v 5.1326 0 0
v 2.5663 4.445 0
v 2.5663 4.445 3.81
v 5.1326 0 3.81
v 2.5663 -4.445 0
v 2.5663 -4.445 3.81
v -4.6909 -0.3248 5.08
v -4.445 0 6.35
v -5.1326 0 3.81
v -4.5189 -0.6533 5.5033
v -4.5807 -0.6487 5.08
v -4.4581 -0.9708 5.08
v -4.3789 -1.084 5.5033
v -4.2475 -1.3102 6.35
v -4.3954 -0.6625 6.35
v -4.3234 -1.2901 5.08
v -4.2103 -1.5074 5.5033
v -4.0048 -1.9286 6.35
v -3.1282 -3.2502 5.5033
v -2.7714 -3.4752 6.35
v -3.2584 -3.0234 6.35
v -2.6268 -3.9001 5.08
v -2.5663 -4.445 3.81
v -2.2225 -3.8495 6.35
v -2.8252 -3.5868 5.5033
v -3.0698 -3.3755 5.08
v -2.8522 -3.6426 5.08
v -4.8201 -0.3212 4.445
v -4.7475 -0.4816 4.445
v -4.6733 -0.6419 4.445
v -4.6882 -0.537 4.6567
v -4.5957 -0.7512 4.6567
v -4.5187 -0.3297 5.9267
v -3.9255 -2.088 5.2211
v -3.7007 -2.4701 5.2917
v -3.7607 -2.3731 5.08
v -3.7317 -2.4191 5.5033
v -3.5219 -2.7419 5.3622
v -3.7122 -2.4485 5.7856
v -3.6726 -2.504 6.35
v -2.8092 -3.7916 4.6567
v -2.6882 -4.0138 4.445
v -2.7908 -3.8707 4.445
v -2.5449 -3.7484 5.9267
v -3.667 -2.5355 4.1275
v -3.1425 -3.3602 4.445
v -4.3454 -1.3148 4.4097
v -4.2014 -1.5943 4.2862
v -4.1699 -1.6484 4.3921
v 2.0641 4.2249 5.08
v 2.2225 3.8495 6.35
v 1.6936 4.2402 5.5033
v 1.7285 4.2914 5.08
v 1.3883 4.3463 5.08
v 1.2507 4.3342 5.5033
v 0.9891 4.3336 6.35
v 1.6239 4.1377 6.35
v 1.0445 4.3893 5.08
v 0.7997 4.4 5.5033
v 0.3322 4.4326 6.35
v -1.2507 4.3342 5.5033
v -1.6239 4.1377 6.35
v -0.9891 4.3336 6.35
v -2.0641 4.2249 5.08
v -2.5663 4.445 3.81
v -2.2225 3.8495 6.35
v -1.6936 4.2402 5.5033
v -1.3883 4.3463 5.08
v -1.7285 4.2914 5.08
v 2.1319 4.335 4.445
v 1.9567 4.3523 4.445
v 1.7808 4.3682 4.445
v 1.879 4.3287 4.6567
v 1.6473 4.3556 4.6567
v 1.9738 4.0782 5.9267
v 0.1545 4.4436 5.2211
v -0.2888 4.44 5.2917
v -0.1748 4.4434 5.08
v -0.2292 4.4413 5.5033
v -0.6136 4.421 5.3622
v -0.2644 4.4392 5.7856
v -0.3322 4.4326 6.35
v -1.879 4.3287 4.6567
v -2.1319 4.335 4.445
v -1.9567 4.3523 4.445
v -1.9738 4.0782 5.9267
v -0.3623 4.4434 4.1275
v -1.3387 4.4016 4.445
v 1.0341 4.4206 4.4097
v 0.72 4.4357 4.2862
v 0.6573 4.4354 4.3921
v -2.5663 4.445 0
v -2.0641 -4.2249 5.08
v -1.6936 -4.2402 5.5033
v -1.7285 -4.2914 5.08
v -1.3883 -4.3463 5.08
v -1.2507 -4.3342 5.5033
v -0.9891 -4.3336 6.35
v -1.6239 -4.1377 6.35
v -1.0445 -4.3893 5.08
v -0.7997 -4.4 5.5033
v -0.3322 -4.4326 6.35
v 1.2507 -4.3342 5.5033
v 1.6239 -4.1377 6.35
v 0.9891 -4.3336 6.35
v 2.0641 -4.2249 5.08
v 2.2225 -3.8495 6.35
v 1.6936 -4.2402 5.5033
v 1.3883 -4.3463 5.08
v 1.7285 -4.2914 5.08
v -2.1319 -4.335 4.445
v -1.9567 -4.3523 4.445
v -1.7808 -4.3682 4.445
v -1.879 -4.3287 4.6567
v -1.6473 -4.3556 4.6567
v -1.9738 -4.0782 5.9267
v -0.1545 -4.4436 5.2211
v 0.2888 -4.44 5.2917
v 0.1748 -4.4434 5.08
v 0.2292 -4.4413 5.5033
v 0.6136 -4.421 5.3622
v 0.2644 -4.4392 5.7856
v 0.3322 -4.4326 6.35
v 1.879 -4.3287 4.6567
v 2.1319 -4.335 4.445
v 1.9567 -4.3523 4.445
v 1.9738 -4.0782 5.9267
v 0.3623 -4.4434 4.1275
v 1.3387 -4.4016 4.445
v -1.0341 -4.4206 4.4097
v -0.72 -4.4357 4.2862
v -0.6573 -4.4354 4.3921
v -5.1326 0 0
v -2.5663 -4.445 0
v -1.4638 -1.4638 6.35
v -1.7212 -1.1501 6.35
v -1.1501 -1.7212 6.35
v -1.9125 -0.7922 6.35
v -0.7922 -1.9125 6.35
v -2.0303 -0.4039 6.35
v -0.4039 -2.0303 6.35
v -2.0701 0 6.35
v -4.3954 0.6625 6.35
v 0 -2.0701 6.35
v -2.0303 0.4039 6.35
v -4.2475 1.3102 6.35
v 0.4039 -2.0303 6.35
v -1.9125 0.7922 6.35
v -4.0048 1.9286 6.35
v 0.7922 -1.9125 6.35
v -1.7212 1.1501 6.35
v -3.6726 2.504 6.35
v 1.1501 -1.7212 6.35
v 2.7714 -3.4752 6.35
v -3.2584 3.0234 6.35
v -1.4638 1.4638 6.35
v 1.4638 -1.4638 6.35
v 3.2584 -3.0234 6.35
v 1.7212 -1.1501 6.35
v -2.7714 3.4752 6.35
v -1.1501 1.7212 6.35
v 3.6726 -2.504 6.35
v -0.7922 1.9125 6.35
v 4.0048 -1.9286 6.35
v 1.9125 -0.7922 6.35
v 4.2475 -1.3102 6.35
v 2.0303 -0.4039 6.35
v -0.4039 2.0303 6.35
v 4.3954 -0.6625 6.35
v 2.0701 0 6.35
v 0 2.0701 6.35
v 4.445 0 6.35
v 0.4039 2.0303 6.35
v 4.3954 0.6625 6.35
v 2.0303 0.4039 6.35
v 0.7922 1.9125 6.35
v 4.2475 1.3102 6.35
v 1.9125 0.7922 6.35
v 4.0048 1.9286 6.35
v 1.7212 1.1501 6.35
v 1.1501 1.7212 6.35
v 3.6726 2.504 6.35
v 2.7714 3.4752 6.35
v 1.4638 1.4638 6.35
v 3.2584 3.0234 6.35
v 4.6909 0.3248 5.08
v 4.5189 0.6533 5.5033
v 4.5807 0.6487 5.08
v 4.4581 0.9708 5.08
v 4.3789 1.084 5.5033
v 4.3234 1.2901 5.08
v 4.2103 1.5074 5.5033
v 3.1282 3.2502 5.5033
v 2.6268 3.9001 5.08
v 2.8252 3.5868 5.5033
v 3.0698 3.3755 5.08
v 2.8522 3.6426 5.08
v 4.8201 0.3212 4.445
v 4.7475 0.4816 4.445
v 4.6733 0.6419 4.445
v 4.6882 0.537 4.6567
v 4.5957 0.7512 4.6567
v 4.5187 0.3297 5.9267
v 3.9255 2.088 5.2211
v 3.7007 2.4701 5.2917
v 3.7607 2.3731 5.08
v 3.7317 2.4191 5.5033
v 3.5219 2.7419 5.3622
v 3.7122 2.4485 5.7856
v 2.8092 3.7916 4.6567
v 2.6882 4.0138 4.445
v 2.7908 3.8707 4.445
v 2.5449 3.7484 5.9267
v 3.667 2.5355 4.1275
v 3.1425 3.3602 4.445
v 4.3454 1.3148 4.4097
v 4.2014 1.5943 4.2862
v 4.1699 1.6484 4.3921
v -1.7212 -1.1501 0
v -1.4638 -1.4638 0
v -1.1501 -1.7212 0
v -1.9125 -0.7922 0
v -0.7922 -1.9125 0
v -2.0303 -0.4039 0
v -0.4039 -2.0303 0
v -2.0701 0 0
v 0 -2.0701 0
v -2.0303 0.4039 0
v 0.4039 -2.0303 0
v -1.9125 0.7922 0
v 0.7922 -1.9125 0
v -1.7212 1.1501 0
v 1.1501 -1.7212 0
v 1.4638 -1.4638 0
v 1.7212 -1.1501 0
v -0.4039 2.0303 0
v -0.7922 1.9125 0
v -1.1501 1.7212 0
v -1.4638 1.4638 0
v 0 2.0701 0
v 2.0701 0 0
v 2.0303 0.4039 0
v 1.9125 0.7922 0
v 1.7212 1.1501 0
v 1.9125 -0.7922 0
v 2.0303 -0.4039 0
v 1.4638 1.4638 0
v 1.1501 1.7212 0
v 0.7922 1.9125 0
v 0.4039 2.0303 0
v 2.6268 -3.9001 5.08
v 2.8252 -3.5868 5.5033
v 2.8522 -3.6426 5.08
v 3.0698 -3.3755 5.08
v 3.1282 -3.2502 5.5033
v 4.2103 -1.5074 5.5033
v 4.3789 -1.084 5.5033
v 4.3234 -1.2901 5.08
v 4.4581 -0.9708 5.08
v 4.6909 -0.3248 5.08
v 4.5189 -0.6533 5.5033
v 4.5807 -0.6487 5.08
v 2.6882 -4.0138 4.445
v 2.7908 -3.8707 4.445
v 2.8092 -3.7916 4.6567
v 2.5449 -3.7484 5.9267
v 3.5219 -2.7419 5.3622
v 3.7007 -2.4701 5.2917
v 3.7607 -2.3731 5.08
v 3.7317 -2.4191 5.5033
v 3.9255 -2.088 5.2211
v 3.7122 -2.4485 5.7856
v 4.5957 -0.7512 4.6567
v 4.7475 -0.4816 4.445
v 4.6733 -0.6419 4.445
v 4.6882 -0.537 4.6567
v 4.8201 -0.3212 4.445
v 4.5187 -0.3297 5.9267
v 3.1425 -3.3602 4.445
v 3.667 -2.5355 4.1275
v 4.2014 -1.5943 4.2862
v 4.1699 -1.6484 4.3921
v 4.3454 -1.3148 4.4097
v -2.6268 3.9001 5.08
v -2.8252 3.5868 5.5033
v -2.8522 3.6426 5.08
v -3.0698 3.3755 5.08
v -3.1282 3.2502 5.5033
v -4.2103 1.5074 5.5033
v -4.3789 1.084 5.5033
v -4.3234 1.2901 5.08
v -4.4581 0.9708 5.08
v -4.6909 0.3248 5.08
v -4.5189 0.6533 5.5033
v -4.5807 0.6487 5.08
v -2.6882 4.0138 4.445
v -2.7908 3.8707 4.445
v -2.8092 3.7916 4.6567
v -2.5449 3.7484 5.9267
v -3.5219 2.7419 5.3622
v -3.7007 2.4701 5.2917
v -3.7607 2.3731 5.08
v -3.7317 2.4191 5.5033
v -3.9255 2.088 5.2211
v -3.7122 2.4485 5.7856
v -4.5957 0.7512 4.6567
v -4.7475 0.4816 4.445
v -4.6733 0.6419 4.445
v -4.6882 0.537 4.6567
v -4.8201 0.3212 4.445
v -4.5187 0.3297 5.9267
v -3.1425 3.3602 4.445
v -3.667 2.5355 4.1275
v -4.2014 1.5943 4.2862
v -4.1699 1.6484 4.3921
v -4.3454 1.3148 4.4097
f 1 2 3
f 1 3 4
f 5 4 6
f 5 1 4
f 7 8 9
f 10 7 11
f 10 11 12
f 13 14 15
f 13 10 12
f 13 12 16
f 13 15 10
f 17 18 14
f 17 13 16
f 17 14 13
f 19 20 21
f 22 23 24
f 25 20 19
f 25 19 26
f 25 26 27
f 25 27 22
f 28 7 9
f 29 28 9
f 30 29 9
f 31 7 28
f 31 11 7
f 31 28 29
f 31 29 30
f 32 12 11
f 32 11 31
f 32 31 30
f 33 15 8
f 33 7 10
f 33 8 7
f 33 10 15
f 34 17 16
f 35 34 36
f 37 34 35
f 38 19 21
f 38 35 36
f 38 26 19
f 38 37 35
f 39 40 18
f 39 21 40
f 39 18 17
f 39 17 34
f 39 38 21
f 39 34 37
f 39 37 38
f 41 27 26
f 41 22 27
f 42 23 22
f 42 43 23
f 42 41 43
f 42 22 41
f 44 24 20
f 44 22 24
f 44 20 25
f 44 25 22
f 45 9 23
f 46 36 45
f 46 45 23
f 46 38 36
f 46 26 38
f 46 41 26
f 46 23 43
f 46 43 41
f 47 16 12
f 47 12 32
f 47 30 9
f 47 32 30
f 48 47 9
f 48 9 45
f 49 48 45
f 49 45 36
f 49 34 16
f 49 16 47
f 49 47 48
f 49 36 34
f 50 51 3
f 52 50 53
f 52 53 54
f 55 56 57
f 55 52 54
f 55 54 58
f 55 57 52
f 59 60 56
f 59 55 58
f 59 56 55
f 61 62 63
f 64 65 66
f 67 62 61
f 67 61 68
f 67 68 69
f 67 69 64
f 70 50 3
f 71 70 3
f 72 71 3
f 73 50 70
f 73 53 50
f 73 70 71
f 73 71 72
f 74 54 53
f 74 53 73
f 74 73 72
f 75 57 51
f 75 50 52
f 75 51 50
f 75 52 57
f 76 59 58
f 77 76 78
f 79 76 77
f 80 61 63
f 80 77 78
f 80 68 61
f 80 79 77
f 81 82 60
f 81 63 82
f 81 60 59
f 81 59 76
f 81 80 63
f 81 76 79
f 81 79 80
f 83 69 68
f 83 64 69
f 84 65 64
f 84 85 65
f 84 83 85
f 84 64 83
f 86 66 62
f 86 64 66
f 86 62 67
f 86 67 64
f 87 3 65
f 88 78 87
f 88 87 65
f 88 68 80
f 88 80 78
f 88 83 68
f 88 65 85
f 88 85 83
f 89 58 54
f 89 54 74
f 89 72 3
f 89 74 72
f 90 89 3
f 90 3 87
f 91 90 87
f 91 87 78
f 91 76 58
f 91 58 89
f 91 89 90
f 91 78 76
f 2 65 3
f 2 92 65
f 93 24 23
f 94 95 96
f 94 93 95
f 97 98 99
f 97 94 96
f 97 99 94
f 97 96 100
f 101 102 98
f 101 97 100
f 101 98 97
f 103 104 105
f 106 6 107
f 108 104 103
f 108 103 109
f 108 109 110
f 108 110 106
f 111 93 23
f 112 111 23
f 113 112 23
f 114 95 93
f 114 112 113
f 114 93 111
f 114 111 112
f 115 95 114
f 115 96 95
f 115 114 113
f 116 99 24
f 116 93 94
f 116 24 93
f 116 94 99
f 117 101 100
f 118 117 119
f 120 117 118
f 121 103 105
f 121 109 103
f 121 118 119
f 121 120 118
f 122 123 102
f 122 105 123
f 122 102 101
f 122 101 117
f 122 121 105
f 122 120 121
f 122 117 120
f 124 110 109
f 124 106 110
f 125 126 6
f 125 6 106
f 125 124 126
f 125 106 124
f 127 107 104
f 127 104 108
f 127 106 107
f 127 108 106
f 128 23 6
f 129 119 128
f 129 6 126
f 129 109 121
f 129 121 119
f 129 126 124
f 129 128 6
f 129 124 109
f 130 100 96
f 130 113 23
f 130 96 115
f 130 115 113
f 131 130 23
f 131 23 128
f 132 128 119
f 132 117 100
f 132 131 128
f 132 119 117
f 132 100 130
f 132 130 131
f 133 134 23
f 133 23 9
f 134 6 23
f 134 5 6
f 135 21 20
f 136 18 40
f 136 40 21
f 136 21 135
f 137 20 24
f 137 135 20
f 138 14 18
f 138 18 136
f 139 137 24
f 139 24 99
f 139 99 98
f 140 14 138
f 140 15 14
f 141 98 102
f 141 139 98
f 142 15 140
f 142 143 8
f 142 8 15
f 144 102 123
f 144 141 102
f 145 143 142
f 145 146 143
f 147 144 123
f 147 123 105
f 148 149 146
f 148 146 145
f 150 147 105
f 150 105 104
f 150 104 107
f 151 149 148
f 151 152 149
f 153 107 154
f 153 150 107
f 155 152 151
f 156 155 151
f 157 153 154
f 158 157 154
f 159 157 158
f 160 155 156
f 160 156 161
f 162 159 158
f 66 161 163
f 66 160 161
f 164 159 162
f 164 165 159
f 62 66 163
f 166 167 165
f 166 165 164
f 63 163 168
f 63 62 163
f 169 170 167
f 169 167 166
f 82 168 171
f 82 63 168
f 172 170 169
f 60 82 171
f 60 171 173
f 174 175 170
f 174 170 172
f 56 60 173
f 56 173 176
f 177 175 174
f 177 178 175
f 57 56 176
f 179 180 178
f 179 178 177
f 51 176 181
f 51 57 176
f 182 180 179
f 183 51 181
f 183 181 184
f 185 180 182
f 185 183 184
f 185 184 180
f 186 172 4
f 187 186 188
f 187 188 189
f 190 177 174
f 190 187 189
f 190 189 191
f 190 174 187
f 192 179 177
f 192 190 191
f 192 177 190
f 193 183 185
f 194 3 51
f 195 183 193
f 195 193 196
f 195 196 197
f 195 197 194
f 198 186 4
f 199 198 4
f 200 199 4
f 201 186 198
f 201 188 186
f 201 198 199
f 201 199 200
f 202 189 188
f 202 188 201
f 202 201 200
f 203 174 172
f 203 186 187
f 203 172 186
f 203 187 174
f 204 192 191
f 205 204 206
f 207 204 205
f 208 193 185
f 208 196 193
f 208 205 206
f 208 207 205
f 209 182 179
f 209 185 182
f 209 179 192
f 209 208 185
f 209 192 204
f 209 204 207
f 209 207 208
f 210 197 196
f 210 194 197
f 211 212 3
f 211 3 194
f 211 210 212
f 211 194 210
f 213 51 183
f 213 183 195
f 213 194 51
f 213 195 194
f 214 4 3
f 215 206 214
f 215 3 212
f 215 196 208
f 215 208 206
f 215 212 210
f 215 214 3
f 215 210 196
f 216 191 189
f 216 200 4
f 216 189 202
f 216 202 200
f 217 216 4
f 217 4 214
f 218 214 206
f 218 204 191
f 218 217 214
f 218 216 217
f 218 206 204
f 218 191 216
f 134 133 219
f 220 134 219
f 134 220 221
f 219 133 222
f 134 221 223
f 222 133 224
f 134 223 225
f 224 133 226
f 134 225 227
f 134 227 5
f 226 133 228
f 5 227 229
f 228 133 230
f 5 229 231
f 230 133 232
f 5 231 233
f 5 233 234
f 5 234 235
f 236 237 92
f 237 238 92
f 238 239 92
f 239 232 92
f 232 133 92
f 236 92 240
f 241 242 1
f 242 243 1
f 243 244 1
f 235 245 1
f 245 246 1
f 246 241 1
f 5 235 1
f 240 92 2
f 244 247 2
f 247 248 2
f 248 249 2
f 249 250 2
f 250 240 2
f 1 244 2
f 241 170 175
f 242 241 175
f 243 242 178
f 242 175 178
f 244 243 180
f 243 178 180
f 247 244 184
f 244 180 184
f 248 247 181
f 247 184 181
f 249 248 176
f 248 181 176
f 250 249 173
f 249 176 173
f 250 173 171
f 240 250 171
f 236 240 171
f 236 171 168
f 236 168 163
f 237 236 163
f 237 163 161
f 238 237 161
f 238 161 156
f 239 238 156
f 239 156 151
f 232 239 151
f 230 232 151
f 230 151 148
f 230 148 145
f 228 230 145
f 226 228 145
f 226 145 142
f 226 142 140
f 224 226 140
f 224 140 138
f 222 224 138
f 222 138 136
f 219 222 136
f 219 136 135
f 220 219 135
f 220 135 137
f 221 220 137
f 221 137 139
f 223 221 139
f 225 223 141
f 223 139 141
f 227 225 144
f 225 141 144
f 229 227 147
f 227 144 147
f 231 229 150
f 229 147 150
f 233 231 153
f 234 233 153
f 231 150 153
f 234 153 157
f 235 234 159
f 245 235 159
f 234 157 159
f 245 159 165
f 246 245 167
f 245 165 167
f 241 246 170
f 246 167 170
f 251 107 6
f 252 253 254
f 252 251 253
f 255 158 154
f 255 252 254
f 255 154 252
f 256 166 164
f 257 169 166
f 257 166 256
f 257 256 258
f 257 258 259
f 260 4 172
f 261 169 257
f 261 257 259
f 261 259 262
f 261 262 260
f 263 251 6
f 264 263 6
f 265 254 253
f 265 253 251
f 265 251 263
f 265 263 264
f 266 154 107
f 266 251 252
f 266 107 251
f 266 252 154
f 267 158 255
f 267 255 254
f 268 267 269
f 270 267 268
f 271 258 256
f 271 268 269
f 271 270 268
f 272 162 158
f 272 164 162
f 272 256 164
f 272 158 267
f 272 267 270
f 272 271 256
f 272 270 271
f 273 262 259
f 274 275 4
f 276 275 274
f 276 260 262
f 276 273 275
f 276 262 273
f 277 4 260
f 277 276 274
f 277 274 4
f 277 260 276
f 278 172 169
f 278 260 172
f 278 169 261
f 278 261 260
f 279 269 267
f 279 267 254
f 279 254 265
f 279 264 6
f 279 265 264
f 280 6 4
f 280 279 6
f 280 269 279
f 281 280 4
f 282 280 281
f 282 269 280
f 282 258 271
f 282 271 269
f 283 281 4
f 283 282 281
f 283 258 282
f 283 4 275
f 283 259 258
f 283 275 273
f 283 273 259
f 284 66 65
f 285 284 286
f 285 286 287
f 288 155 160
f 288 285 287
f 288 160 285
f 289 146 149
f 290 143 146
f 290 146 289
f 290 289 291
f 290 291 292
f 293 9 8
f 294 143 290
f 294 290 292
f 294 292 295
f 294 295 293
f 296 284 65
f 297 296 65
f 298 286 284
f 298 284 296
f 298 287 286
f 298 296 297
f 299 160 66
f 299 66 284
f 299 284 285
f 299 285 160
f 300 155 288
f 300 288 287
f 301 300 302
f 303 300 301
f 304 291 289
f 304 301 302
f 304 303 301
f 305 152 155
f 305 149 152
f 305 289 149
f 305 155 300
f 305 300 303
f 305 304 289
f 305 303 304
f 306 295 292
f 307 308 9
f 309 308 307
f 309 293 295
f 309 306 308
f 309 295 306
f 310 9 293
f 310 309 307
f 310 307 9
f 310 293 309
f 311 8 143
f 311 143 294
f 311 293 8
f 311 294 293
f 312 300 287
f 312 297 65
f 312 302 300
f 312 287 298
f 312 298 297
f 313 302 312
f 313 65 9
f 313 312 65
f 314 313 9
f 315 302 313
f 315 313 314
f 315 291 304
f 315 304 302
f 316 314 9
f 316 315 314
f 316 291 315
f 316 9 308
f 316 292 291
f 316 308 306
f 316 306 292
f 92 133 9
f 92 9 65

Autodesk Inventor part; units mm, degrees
ref_plane "YZ Plane" through (0, 0, 0) normal (1, 0, 0) x (0, 1, 0)
ref_plane "XZ Plane" through (0, 0, 0) normal (0, 1, 0) x (-1, 0, 0)
sketch "Sketch1" plane through (0, 0, 0) normal (0, 0, 1) x (1, 0, 0)
  line L0 (2.5663, 4.445) -> (5.1326, 0)
  line L1 (5.1326, 0) -> (2.5663, -4.445)
  line L2 (2.5663, -4.445) -> (-2.5663, -4.445)
  line L3 (-2.5663, -4.445) -> (-5.1326, 0)
  line L4 (-5.1326, 0) -> (-2.5663, 4.445)
  line L5 (-2.5663, 4.445) -> (2.5663, 4.445)
  line L6 (0, 0) -> (0.7817, 0)
  dimension "d0" = 8.89
extrude "Extrusion1" add sketch "Sketch1" along normal blind 3.81
sketch "Sketch2" plane through (0, 0, 3.81) normal (0, 0, 1) x (1, 0, 0)
  line L0 (5.1326, 0) -> (2.5663, 4.445) projected
  line L1 (2.5663, 4.445) -> (-2.5663, 4.445) projected
  line L2 (-2.5663, 4.445) -> (-5.1326, 0) projected
  line L3 (-5.1326, 0) -> (-2.5663, -4.445) projected
  line L4 (-2.5663, -4.445) -> (2.5663, -4.445) projected
  line L5 (2.5663, -4.445) -> (5.1326, 0) projected
  point P0 (0, 0)
ref_plane "Work Plane1" through (0, 0, 6.35) normal (0, 0, 1) x (1, 0, 0)
sketch "Sketch3" plane through (0, 0, 6.35) normal (0, 0, 1) x (1, 0, 0)
  circle A0 centre (0, 0) radius 4.445
  dimension "d4" = 8.89
loft "Loft1" add profiles "Sketch2", "Sketch3"
sketch "Sketch4" plane through (0, 0, 6.35) normal (0, 0, 1) x (1, 0, 0)
  circle A0 centre (0, 0) radius 2.0701
  dimension "d9" = 4.1402
extrude "Extrusion2" cut sketch "Sketch4" against normal blind 25.4
properties part number "RobotArm Nut3"
